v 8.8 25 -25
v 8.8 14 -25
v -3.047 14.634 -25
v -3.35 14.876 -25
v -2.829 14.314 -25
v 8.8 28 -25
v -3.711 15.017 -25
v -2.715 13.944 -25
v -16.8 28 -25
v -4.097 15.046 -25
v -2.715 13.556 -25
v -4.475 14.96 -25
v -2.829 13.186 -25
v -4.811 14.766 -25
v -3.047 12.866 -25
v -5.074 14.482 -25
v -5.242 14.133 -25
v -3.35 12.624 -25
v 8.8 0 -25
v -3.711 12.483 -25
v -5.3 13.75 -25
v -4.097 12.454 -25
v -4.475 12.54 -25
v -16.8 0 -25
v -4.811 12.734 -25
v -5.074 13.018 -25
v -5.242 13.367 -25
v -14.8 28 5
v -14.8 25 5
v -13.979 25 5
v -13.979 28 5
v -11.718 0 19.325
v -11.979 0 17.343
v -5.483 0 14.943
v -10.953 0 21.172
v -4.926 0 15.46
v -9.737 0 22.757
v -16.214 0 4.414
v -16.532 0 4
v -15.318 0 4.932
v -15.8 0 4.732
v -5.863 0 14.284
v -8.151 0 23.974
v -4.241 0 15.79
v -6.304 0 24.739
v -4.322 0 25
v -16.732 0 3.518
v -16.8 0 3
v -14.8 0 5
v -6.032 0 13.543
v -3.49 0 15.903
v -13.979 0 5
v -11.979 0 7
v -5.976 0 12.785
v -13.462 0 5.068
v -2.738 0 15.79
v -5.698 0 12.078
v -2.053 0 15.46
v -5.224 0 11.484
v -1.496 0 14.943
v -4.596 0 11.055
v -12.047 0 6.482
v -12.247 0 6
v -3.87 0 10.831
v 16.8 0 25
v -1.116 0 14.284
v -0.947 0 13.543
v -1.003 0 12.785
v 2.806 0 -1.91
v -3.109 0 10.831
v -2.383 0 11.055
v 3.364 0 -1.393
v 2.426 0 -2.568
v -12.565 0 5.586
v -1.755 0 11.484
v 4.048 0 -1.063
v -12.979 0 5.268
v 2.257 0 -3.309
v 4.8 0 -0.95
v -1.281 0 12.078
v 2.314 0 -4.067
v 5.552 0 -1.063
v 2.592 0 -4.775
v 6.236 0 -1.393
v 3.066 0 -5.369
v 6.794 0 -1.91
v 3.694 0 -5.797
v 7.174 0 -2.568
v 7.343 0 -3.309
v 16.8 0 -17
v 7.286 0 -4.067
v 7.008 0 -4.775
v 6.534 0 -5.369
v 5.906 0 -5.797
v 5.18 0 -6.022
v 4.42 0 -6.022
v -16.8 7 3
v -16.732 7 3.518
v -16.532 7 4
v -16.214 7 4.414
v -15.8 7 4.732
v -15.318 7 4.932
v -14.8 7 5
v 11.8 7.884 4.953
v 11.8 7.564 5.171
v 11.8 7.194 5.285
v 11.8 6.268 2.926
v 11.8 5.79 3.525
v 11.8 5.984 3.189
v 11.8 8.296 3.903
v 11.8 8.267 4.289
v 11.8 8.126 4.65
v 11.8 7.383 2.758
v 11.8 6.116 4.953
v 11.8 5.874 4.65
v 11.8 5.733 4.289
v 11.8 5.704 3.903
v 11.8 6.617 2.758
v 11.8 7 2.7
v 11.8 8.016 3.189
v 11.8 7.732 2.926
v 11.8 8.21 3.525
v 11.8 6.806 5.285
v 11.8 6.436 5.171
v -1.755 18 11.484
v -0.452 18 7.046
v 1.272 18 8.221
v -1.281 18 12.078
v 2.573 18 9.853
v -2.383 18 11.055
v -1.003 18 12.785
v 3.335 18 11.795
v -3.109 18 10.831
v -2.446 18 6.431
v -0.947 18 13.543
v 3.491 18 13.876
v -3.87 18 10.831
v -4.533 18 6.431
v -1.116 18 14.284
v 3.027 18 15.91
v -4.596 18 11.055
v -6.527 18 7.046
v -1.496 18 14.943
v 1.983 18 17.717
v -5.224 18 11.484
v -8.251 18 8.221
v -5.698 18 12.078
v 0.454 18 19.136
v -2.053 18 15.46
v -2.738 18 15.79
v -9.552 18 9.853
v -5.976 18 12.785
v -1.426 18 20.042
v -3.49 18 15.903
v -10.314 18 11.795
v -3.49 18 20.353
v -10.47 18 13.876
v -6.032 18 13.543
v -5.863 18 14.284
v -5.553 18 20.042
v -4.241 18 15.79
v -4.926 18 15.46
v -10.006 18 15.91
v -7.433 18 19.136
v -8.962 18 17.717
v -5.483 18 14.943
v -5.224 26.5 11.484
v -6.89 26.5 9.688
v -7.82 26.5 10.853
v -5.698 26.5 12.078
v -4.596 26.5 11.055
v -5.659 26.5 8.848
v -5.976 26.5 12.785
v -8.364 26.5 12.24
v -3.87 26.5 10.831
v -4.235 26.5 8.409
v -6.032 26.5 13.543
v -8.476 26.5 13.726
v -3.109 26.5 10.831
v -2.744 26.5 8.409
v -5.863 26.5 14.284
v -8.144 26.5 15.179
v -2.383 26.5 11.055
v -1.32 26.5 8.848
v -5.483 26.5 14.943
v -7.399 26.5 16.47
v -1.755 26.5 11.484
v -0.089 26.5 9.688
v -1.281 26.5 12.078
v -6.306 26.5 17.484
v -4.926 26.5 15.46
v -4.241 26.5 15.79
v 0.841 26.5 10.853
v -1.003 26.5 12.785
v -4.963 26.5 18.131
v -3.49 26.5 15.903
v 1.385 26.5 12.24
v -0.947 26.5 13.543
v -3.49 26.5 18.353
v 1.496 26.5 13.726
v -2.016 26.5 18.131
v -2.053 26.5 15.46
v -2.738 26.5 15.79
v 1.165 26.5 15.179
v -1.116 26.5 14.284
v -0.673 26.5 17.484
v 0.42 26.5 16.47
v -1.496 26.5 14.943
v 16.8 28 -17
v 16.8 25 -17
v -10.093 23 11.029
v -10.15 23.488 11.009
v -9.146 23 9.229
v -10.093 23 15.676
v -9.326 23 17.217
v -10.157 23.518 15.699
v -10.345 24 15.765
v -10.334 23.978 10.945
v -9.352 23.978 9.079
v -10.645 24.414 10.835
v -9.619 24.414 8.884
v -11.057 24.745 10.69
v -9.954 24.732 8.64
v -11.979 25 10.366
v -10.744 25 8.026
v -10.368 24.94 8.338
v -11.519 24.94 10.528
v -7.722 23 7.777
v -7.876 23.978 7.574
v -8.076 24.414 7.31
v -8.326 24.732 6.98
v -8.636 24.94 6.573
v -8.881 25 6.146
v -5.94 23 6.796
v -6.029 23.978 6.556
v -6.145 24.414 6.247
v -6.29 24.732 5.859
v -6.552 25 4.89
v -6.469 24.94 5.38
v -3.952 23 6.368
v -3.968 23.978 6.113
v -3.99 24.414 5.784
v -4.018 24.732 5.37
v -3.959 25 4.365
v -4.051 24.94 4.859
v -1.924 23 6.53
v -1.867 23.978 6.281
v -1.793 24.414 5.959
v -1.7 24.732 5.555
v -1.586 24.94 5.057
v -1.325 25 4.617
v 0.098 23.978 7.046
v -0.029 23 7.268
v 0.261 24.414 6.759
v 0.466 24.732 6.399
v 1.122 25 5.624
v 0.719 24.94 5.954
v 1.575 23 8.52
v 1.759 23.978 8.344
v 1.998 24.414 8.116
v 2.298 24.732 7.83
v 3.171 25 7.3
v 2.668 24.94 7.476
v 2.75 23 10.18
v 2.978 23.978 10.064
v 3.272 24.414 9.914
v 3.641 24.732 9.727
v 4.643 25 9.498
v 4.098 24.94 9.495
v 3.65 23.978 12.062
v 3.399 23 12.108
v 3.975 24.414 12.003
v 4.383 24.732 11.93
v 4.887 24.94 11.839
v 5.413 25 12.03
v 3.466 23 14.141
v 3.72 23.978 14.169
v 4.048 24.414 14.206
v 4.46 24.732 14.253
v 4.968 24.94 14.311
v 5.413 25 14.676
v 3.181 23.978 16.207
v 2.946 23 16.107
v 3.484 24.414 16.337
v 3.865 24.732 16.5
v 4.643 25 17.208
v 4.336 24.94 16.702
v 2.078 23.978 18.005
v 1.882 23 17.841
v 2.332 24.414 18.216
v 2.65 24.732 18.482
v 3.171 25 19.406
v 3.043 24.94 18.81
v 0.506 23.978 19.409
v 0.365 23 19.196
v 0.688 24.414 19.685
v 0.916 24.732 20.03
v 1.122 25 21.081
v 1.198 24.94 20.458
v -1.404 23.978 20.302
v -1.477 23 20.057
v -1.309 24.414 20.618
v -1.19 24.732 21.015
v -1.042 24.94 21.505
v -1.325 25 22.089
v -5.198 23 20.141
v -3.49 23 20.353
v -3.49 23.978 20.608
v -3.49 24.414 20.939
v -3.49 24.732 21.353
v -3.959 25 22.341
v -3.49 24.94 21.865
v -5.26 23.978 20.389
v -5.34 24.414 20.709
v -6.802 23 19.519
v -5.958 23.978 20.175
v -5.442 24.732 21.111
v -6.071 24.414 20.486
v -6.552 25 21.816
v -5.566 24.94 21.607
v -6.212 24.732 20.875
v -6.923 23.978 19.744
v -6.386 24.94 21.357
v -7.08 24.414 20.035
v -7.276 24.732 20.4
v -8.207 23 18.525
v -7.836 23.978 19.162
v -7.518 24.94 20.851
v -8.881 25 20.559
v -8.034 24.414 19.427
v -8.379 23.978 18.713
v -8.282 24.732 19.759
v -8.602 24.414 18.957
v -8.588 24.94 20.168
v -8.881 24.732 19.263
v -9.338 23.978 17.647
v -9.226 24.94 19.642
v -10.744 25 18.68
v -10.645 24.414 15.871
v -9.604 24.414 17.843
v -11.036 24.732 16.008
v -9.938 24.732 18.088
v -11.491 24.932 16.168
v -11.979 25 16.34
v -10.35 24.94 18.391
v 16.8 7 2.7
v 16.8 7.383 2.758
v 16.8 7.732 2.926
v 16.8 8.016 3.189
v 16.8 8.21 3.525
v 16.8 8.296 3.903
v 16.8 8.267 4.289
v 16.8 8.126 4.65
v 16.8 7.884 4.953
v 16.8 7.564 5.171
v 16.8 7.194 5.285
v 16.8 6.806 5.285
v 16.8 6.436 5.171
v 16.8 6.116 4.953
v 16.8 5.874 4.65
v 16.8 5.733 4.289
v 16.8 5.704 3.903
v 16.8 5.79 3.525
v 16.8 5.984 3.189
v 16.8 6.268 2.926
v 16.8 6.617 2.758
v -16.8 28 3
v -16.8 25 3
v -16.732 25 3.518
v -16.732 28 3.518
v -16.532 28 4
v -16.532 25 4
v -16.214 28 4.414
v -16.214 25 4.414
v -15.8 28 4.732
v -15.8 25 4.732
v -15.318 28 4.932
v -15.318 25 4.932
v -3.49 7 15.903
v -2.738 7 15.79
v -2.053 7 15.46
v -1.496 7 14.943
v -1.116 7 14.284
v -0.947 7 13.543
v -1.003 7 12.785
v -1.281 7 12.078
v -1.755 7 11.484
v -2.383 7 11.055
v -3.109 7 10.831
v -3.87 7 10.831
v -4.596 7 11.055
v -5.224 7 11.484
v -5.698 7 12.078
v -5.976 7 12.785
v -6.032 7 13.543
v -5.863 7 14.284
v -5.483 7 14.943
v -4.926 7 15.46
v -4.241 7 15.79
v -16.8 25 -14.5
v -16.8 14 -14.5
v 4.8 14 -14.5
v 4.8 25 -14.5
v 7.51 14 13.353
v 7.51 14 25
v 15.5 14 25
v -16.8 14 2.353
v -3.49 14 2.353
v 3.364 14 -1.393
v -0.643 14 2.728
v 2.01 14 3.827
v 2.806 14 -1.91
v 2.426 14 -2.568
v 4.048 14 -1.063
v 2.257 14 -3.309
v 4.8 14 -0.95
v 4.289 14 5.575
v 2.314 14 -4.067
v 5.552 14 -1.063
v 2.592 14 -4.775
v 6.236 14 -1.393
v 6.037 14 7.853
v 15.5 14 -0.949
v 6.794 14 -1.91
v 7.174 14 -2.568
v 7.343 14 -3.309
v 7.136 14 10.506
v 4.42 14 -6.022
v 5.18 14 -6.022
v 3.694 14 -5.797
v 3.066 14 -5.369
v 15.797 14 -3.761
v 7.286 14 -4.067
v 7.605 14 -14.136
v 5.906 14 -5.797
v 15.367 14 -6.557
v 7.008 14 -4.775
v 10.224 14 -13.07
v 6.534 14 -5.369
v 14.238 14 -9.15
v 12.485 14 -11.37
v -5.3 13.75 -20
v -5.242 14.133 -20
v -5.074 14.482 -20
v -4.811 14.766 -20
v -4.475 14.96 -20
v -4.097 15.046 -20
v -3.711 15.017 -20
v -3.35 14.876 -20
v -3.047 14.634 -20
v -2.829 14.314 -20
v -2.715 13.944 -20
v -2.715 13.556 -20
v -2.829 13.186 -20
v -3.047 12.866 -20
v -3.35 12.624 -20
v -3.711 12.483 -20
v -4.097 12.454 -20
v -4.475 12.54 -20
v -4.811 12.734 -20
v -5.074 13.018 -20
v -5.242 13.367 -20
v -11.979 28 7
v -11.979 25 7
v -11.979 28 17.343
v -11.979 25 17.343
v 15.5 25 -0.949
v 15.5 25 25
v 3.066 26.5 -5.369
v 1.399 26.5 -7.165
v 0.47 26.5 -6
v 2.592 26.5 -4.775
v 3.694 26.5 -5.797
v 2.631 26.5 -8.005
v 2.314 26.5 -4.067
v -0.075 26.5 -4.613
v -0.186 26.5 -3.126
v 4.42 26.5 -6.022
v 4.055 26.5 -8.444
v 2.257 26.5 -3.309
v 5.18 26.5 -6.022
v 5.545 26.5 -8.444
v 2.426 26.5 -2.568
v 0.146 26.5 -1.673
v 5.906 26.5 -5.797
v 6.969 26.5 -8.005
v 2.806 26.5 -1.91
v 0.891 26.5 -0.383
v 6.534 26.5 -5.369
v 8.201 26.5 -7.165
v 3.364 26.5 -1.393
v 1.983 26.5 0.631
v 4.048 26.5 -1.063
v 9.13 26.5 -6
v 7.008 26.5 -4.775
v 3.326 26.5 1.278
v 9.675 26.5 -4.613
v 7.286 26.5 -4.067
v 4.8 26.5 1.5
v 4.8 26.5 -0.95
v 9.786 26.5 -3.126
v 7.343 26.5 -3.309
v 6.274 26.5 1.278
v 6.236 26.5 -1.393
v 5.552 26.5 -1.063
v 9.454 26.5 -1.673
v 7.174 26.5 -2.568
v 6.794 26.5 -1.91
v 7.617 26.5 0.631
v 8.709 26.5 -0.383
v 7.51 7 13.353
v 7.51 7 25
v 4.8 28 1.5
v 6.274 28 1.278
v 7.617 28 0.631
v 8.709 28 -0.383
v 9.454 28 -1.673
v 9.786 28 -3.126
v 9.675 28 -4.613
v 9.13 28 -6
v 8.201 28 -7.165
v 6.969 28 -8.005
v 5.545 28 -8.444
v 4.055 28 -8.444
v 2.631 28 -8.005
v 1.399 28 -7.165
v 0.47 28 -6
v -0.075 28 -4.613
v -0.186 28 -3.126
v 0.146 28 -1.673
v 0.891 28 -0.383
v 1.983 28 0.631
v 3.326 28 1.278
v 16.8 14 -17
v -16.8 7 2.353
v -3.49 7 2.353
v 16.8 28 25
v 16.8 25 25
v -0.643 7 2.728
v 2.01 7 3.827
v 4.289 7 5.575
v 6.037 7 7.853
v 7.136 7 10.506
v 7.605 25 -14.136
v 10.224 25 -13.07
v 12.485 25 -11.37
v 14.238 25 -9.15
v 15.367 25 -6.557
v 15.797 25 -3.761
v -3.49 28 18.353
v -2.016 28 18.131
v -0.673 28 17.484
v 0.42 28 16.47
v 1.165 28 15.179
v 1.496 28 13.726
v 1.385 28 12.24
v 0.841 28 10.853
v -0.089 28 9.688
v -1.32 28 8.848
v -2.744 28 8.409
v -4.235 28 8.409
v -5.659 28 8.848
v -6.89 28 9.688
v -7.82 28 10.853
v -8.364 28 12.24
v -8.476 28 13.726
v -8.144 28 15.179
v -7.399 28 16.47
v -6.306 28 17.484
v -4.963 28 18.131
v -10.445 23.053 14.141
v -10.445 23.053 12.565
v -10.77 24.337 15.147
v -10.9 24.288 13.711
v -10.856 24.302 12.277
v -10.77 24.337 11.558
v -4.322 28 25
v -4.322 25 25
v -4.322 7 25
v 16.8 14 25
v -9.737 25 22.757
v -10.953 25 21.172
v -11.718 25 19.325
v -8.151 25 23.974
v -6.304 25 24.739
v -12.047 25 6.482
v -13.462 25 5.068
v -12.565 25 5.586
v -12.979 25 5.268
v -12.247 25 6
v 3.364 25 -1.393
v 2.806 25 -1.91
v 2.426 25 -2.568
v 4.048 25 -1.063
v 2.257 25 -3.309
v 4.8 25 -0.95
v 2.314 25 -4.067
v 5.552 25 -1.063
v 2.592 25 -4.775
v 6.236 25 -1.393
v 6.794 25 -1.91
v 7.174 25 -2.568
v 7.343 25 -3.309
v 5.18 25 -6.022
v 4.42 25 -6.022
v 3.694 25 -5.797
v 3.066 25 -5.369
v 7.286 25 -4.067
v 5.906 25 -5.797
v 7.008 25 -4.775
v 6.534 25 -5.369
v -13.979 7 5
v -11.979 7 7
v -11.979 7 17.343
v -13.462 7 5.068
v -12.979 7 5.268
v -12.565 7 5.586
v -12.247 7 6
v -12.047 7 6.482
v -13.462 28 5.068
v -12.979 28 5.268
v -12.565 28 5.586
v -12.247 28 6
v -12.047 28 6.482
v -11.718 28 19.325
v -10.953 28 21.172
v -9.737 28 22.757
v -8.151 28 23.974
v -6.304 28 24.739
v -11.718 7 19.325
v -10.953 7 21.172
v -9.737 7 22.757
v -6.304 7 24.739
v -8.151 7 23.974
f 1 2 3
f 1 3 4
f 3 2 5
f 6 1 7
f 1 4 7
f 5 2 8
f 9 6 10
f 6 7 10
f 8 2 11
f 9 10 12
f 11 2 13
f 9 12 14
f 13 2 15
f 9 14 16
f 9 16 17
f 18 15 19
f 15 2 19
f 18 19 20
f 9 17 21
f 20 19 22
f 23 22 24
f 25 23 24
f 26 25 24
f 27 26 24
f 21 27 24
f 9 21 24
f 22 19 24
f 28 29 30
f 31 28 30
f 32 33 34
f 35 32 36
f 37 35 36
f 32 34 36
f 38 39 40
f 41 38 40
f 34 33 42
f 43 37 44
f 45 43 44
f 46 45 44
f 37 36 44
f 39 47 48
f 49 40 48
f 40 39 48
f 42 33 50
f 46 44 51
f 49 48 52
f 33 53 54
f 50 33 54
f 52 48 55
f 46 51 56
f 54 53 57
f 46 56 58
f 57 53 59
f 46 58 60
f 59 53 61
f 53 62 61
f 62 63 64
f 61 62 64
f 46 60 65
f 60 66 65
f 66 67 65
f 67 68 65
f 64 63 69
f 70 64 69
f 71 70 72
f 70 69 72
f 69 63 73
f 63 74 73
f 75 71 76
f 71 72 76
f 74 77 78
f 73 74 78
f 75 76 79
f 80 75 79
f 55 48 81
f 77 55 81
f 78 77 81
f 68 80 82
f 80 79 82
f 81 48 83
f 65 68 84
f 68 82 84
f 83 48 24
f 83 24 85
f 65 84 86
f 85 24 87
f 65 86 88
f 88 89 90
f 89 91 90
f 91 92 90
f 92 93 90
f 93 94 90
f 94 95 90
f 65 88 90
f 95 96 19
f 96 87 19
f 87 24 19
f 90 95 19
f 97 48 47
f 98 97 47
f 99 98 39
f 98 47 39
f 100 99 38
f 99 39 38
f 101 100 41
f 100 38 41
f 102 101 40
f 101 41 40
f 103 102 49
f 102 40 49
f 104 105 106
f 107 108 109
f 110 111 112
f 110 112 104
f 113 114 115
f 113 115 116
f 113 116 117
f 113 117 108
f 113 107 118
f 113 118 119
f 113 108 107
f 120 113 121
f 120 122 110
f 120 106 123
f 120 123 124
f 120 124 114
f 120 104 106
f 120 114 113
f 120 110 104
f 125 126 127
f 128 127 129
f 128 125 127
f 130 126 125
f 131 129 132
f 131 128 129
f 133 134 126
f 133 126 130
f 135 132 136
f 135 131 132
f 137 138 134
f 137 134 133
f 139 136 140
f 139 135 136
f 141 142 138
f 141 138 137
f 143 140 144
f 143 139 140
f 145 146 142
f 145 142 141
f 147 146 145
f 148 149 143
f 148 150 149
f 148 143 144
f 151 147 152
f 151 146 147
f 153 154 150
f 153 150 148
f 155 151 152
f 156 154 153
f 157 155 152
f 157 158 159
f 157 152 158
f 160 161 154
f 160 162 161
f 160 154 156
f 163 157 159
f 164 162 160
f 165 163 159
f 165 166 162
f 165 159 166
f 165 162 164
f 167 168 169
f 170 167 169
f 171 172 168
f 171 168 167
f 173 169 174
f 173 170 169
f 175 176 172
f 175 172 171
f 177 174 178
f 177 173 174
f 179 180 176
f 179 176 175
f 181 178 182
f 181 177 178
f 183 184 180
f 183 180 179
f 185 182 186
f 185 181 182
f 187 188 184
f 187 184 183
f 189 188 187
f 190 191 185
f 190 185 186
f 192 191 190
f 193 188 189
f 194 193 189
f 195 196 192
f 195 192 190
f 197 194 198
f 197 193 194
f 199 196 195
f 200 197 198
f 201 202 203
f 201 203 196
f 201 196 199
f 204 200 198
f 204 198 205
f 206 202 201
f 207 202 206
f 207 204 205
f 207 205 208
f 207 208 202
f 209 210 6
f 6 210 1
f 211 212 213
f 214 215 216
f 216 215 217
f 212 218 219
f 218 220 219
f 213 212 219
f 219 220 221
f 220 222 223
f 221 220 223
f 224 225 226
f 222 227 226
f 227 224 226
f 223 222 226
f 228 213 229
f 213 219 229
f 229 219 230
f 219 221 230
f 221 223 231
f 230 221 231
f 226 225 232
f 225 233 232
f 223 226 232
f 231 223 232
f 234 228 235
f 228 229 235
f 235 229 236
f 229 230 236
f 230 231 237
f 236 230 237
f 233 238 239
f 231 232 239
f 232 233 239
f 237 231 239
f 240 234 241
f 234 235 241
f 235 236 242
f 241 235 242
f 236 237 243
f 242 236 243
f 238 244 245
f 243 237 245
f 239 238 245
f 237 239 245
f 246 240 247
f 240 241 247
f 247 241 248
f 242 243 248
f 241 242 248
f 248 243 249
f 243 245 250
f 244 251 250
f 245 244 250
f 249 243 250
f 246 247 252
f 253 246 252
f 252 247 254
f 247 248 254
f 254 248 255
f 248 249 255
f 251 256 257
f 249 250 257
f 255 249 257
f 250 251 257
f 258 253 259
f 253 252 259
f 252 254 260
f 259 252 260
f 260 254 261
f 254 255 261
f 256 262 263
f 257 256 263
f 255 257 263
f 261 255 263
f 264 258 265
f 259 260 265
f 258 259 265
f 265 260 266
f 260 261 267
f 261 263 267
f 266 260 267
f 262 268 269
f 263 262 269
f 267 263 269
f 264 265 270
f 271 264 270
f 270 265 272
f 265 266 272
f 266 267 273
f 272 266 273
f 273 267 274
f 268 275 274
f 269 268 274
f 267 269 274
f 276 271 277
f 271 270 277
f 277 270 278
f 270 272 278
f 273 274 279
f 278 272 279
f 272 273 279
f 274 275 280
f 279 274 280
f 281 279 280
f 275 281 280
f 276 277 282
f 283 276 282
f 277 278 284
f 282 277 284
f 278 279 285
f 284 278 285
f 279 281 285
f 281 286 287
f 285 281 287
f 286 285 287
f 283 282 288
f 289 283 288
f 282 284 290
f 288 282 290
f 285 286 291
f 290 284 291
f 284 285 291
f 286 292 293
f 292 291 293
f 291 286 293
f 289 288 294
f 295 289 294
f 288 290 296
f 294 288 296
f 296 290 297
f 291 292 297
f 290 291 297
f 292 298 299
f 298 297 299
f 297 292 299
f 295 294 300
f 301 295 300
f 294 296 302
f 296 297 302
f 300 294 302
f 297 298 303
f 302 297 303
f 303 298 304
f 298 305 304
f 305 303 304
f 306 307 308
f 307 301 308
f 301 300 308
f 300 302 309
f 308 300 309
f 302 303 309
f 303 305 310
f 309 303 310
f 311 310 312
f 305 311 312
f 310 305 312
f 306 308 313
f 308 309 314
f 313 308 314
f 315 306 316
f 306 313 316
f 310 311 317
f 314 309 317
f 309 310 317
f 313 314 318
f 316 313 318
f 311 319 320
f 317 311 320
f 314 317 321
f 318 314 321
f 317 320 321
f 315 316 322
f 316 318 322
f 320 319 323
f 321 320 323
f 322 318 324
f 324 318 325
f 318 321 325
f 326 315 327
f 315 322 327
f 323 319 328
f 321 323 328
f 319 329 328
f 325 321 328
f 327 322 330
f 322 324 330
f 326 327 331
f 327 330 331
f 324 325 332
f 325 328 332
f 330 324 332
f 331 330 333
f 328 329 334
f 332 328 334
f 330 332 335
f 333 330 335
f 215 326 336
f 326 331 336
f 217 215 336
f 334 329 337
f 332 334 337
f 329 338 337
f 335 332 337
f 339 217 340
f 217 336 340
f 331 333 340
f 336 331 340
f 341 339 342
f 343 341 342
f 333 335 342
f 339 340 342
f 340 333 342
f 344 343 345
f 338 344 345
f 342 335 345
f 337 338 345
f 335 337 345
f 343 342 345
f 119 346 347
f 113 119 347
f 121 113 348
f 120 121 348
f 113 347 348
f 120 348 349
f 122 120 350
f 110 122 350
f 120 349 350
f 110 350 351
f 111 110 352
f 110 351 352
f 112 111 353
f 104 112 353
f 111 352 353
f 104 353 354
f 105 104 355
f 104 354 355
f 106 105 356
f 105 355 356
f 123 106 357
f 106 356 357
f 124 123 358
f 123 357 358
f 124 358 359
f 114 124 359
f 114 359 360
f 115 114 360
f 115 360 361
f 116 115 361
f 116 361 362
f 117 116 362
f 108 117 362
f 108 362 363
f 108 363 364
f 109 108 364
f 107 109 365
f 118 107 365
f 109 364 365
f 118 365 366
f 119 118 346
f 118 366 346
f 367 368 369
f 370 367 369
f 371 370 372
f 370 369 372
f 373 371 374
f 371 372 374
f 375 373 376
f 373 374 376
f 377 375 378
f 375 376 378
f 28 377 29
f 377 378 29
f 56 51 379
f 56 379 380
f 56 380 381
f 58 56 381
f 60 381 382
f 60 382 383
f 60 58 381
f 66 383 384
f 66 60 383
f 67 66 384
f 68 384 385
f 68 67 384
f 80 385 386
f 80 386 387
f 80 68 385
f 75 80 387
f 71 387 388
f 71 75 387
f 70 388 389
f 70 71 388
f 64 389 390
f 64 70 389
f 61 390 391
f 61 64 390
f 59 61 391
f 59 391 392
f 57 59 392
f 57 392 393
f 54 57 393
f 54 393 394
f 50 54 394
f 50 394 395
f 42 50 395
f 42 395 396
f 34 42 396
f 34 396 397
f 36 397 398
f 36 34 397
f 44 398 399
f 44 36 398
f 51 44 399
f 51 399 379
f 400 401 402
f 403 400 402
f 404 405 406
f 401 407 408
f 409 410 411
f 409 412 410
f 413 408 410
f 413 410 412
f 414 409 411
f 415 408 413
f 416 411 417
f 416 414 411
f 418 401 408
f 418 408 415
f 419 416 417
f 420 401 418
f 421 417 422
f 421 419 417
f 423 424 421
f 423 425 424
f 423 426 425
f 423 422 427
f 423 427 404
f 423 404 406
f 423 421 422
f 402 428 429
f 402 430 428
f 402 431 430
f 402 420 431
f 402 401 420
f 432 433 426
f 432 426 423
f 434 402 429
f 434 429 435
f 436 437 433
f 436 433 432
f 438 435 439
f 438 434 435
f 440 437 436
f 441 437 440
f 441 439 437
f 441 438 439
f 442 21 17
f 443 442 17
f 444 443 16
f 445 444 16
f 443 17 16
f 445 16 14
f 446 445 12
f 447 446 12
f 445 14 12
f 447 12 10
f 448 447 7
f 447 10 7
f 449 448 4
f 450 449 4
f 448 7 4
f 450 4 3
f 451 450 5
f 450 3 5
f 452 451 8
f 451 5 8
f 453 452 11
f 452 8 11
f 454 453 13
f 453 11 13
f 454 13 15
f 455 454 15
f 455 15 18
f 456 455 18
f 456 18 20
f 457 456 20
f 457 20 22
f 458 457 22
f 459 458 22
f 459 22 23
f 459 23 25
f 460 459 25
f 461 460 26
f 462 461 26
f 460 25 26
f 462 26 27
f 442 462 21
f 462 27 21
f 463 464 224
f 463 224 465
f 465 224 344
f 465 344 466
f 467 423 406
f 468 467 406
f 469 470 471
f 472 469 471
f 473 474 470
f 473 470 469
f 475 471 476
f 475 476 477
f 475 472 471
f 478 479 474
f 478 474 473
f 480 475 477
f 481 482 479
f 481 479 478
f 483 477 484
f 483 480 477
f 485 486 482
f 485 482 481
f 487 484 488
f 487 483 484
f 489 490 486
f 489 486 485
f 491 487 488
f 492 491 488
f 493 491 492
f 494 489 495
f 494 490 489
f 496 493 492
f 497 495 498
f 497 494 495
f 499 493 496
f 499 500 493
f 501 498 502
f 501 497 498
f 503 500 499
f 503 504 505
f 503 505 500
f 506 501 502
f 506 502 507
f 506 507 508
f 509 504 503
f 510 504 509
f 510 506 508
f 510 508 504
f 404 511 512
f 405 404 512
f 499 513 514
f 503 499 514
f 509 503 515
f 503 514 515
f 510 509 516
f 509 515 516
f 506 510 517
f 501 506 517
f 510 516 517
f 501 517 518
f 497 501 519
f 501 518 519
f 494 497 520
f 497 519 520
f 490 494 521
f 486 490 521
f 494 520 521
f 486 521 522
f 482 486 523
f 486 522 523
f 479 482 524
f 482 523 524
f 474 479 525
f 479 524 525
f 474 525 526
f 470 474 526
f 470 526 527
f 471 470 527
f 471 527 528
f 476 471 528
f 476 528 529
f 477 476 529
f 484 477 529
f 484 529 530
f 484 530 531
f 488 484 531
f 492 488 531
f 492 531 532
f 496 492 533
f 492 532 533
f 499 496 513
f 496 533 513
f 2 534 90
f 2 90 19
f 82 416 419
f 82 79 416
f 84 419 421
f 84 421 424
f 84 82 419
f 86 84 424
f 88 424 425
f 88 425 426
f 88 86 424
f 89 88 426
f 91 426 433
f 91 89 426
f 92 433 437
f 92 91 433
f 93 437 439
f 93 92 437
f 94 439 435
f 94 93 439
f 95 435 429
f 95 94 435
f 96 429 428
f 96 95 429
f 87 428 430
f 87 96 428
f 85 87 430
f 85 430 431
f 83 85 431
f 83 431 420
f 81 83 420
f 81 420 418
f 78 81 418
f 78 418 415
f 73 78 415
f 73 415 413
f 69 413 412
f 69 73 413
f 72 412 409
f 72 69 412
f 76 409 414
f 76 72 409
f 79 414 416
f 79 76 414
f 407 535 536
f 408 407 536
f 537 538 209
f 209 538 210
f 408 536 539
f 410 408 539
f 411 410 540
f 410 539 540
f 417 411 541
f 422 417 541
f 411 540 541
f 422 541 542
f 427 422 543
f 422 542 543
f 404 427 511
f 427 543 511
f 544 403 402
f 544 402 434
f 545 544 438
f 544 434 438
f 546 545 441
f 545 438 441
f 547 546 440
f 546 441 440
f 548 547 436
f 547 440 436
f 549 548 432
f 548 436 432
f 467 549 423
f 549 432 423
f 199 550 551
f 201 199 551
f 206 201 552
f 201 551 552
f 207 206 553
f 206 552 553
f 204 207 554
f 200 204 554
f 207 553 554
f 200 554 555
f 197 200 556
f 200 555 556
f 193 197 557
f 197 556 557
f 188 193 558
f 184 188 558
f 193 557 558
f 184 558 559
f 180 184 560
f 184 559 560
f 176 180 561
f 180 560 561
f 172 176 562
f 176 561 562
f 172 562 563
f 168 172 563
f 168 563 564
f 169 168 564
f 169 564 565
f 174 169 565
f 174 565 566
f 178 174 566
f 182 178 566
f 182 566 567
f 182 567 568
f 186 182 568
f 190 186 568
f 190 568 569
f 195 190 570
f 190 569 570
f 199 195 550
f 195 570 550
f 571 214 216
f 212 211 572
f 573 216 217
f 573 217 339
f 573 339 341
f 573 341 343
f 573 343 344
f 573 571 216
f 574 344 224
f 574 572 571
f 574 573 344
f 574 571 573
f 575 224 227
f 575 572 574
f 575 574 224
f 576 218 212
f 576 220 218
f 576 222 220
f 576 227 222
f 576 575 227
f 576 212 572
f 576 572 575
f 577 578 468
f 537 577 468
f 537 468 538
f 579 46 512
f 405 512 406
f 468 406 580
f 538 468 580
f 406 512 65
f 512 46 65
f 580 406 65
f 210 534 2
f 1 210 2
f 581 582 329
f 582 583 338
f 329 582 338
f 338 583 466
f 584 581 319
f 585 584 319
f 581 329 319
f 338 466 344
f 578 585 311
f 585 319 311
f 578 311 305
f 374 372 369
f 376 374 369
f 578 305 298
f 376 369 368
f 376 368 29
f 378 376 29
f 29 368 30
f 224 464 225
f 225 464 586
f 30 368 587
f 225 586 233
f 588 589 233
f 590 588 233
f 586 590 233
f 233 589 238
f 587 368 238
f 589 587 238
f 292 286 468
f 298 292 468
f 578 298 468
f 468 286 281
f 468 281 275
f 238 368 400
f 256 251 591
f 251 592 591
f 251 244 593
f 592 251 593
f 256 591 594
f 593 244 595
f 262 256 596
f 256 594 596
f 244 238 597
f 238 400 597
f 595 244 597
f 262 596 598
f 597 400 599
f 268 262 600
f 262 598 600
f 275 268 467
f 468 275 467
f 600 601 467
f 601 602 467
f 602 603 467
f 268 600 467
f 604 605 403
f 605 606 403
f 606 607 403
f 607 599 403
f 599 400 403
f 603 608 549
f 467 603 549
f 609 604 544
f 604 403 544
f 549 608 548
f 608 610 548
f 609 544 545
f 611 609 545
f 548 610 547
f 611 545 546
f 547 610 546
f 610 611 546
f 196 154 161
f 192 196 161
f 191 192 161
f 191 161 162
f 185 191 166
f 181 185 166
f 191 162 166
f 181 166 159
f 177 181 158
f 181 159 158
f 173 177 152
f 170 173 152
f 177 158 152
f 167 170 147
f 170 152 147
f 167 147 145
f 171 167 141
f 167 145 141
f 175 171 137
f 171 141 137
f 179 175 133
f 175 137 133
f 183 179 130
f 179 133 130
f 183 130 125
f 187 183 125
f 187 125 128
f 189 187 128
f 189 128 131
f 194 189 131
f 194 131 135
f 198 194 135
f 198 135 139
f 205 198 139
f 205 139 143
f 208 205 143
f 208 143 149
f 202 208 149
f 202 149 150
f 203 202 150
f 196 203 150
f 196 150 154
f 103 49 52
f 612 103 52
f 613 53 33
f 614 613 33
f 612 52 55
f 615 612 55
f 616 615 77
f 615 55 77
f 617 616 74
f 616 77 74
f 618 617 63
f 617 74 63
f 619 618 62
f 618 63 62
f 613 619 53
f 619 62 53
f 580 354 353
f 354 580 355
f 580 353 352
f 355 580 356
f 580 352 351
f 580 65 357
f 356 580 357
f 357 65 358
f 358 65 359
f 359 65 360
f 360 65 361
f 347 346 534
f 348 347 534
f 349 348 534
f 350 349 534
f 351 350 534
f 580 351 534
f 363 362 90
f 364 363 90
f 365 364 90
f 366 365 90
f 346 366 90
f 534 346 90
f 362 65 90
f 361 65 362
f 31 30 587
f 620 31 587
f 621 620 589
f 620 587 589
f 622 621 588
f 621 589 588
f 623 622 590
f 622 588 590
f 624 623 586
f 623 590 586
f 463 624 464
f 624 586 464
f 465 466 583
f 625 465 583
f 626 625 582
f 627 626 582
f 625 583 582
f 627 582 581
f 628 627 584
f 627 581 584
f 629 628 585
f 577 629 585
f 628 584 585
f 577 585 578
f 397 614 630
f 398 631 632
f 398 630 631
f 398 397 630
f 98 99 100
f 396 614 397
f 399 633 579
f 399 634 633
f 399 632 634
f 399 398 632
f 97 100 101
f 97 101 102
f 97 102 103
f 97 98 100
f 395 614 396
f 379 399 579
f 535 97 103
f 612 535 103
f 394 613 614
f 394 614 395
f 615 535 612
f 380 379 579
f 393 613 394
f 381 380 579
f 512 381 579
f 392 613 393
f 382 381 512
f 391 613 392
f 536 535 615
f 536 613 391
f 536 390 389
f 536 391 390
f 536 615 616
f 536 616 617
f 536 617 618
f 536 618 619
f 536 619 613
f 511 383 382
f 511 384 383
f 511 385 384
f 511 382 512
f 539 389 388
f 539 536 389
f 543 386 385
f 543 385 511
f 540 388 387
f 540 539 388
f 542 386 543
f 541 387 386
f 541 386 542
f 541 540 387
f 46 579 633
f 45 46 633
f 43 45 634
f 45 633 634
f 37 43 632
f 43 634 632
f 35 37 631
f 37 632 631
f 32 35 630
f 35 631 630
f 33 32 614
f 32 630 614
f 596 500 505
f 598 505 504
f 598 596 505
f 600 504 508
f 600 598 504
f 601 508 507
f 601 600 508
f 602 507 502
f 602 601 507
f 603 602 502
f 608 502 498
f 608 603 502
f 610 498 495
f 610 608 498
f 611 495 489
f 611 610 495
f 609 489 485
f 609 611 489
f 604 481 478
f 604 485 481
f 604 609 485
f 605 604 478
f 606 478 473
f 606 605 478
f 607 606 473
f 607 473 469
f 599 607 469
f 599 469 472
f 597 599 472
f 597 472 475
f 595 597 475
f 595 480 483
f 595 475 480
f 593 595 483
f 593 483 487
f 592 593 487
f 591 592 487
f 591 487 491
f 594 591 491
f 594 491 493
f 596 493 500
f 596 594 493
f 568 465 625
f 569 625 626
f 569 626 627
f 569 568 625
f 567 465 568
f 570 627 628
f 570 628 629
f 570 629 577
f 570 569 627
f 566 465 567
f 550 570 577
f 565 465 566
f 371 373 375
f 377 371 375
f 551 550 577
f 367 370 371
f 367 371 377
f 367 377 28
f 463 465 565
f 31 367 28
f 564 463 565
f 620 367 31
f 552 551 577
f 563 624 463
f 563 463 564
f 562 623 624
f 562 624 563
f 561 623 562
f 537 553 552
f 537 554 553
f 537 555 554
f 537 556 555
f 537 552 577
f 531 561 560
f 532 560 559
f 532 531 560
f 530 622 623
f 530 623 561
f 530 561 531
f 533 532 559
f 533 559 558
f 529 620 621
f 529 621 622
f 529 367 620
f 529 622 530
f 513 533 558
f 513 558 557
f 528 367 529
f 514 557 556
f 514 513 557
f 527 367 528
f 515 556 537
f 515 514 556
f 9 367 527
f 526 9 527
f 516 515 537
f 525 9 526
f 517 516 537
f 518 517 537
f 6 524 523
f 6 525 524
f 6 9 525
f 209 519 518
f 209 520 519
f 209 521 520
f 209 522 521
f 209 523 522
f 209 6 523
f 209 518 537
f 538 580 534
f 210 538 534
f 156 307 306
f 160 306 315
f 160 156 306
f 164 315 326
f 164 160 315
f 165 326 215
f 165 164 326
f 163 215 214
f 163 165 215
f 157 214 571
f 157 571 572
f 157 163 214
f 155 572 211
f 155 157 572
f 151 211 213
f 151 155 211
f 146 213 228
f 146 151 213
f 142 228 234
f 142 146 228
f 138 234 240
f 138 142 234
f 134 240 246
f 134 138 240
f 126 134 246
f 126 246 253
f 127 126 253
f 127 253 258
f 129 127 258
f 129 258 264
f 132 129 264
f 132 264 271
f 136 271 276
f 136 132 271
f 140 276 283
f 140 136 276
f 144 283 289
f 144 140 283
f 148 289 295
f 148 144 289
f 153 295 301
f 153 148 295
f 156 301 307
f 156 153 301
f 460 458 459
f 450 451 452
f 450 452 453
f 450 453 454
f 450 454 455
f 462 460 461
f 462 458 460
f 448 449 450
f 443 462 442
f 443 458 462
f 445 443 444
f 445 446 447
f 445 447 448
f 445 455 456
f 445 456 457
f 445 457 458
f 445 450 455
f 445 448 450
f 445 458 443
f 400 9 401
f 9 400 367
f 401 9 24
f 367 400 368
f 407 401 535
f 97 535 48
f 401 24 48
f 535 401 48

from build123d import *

# Parameters (mm, degrees)
SKETCH_1_R          = 2.55
EXTRUDE_1_DEPTH     = 7
SKETCH_3_R          = 2.55
EXTRUDE_2_DEPTH     = 7
EXTRUDE_3_DEPTH     = 11
SKETCH_5_R          = 2.55
EXTRUDE_4_DEPTH     = 3
EXTRUDE_START       = 7
SKETCH_6_R          = 7
SKETCH_6_R_2        = 2.55
EXTRUDE_5_DEPTH     = 7
SKETCH_7_R          = 1.3
CUT_EXTRUDE_1_DEPTH = 5
SKETCH_8_R          = 1.3
CUT_EXTRUDE_2_DEPTH = 5
SKETCH_9_R          = 5
CUT_EXTRUDE_3_DEPTH = 1.5
CUT_EXTRUDE_4_REACH = 38.718
FILLET_1_R          = 2


with BuildPart() as part:
    # Эскиз1 → Бобышка-Вытянуть1 (new body)
    with BuildSketch(Plane(origin=(0, 0, 0), x_dir=(1, 0, 0), z_dir=(0, 1, 0))):
        with BuildLine():
            Line((8.8, 25), (-16.8, 25))
            Line((-16.8, 25), (-16.8, -3))
            ThreePointArc((-16.8, -3), (-16.214213562, -4.414213562), (-14.8, -5))
            Line((-14.8, -5), (-13.979301231, -5))
            ThreePointArc((-13.979301231, -5), (-12.565087669, -5.585786438), (-11.979301231, -7))
            Line((-11.979301231, -7), (-11.979301231, -23))
            ThreePointArc((-11.979301231, -23), (-11.393514794, -24.414213562), (-9.979301231, -25))
            Line((-9.979301231, -25), (16.8, -25))
            Line((16.8, -25), (16.8, 17))
            Line((16.8, 17), (8.8, 25))
        make_face()
        with Locations(Location((4.8, 3.5, 0), (0, 0, 270))):
            Circle(SKETCH_1_R, mode=Mode.SUBTRACT)
        with Locations(Location((-3.489533647, -13.352791034, 0), (0, 0, 270))):
            Circle(SKETCH_1_R, mode=Mode.SUBTRACT)
    extrude(amount=EXTRUDE_1_DEPTH)

    # Эскиз3 → Бобышка-Вытянуть2 (add)
    with BuildSketch(Plane(origin=(0, 7, 0), x_dir=(1, 0, 0), z_dir=(0, 1, 0))):
        with BuildLine():
            Line((8.8, 25), (-16.8, 25))
            Line((-16.8, 25), (-16.8, -2.352791034))
            Line((-16.8, -2.352791034), (-3.489533647, -2.352791034))
            ThreePointArc((-3.489533647, -2.352791034), (4.288640946, -5.574616441), (7.510466353, -13.352791034))
            Line((7.510466353, -13.352791034), (7.510466353, -25))
            Line((7.510466353, -25), (16.8, -25))
            Line((16.8, -25), (16.8, 17))
            Line((16.8, 17), (8.8, 25))
        make_face()
        with Locations(Location((4.8, 3.5, 0), (0, 0, 270))):
            Circle(SKETCH_3_R, mode=Mode.SUBTRACT)
    extrude(amount=EXTRUDE_2_DEPTH)

    # Эскиз4 → Бобышка-Вытянуть3 (add)
    with BuildSketch(Plane(origin=(0, 14, 0), x_dir=(1, 0, 0), z_dir=(0, 1, 0))):
        with BuildLine():
            Line((8.800011647, 25), (-16.8, 25))
            Line((-16.8, 25), (-16.8, 14.5))
            Line((-16.8, 14.5), (4.8, 14.5))
            ThreePointArc((4.8, 14.5), (13.433239095, 10.316684145), (15.500011647, 0.948578679))
            Line((15.500011647, 0.948578679), (15.500011647, -25))
            Line((15.500011647, -25), (16.800011647, -25))
            Line((16.800011647, -25), (16.800011647, 17))
            Line((16.800011647, 17), (8.800011647, 25))
        make_face()
    extrude(amount=EXTRUDE_3_DEPTH)

    # Эскиз5 → Бобышка-Вытянуть4 (add)
    with BuildSketch(Plane(origin=(0, 25, 0), x_dir=(1, 0, 0), z_dir=(0, 1, 0))):
        with BuildLine():
            Line((8.8, 25), (-16.8, 25))
            Line((-16.8, 25), (-16.8, -3))
            ThreePointArc((-16.8, -3), (-16.214213562, -4.414213562), (-14.8, -5))
            Line((-14.8, -5), (-13.979301231, -5))
            ThreePointArc((-13.979301231, -5), (-12.565087669, -5.585786438), (-11.979301231, -7))
            Line((-11.979301231, -7), (-11.979301231, -17.343145751))
            ThreePointArc((-11.979301231, -17.343145751), (-9.736660544, -22.757359313), (-4.322446982, -25))
            Line((-4.322446982, -25), (16.8, -25))
            Line((16.8, -25), (16.8, 17))
            Line((16.8, 17), (8.8, 25))
        make_face()
        with Locations(Location((4.8, 3.5, 0), (0, 0, 270))):
            Circle(SKETCH_5_R, mode=Mode.SUBTRACT)
        with Locations(Location((-3.489533647, -13.352791034, 0), (0, 0, 270))):
            Circle(SKETCH_5_R, mode=Mode.SUBTRACT)
    extrude(amount=EXTRUDE_4_DEPTH)

    # Эскиз6 → Бобышка-Вытянуть5 (add)
    with BuildSketch(Plane.XZ.offset(-25).offset(EXTRUDE_START)):
        with Locations(Location((-3.489533647, 13.352791034, 0), (0, 0, 90))):
            Circle(SKETCH_6_R)
        with Locations(Location((-3.489533647, 13.352791034, 0), (0, 0, 90))):
            Circle(SKETCH_6_R_2, mode=Mode.SUBTRACT)
    extrude(amount=-EXTRUDE_5_DEPTH)

    # Эскиз7 → Вырез-Вытянуть1 (cut)
    with BuildSketch(Plane(origin=(0, 0, -25), x_dir=(-1, 0, 0), z_dir=(0, 0, -1))):
        with Locations((4, 13.75)):
            Circle(SKETCH_7_R)
    extrude(amount=-CUT_EXTRUDE_1_DEPTH, mode=Mode.SUBTRACT)

    # Эскиз8 → Вырез-Вытянуть2 (cut)
    with BuildSketch(Plane(origin=(16.8, 0, 0), x_dir=(0, 0, -1), z_dir=(1, 0, 0))):
        with Locations((-4, 7)):
            Circle(SKETCH_8_R)
    extrude(amount=-CUT_EXTRUDE_2_DEPTH, mode=Mode.SUBTRACT)

    # Эскиз9 → Вырез-Вытянуть3 (cut)
    with BuildSketch(Plane(origin=(0, 28, 0), x_dir=(1, 0, 0), z_dir=(0, 1, 0))):
        with Locations(Location((4.8, 3.5, 0), (0, 0, 270))):
            Circle(SKETCH_9_R)
        with Locations(Location((-3.489533647, -13.352791034, 0), (0, 0, 270))):
            Circle(SKETCH_9_R)
    extrude(amount=-CUT_EXTRUDE_3_DEPTH, mode=Mode.SUBTRACT)

    # Эскиз11 → Вырез-Вытянуть4 (cut, up to next)
    with BuildSketch(Plane(origin=(0, 7, 0), x_dir=(1, 0, 0), z_dir=(0, 1, 0)), mode=Mode.PRIVATE) as cut_extrude_4_sk1:
        with BuildLine():
            Line((-11.979301231, -17.343145751), (-11.979301231, -25))
            Line((-11.979301231, -25), (-4.322446982, -25))
            ThreePointArc((-4.322446982, -25), (-9.736660544, -22.757359313), (-11.979301231, -17.343145751))
        make_face()
    cut_extrude_4_tool1 = extrude(cut_extrude_4_sk1.sketch, amount=-CUT_EXTRUDE_4_REACH, mode=Mode.PRIVATE) & part.part
    add(cut_extrude_4_tool1.solids().sort_by_distance((-10.269005, 7, 23.289704))[0], mode=Mode.SUBTRACT)

    # Скругление1
    fillet_1_edges = [part.edges().sort_by_distance(p)[0] for p in [
        (-3.489533647, 25, 6.352791034),
    ]]
    fillet(fillet_1_edges, radius=FILLET_1_R)


solid = part.part
